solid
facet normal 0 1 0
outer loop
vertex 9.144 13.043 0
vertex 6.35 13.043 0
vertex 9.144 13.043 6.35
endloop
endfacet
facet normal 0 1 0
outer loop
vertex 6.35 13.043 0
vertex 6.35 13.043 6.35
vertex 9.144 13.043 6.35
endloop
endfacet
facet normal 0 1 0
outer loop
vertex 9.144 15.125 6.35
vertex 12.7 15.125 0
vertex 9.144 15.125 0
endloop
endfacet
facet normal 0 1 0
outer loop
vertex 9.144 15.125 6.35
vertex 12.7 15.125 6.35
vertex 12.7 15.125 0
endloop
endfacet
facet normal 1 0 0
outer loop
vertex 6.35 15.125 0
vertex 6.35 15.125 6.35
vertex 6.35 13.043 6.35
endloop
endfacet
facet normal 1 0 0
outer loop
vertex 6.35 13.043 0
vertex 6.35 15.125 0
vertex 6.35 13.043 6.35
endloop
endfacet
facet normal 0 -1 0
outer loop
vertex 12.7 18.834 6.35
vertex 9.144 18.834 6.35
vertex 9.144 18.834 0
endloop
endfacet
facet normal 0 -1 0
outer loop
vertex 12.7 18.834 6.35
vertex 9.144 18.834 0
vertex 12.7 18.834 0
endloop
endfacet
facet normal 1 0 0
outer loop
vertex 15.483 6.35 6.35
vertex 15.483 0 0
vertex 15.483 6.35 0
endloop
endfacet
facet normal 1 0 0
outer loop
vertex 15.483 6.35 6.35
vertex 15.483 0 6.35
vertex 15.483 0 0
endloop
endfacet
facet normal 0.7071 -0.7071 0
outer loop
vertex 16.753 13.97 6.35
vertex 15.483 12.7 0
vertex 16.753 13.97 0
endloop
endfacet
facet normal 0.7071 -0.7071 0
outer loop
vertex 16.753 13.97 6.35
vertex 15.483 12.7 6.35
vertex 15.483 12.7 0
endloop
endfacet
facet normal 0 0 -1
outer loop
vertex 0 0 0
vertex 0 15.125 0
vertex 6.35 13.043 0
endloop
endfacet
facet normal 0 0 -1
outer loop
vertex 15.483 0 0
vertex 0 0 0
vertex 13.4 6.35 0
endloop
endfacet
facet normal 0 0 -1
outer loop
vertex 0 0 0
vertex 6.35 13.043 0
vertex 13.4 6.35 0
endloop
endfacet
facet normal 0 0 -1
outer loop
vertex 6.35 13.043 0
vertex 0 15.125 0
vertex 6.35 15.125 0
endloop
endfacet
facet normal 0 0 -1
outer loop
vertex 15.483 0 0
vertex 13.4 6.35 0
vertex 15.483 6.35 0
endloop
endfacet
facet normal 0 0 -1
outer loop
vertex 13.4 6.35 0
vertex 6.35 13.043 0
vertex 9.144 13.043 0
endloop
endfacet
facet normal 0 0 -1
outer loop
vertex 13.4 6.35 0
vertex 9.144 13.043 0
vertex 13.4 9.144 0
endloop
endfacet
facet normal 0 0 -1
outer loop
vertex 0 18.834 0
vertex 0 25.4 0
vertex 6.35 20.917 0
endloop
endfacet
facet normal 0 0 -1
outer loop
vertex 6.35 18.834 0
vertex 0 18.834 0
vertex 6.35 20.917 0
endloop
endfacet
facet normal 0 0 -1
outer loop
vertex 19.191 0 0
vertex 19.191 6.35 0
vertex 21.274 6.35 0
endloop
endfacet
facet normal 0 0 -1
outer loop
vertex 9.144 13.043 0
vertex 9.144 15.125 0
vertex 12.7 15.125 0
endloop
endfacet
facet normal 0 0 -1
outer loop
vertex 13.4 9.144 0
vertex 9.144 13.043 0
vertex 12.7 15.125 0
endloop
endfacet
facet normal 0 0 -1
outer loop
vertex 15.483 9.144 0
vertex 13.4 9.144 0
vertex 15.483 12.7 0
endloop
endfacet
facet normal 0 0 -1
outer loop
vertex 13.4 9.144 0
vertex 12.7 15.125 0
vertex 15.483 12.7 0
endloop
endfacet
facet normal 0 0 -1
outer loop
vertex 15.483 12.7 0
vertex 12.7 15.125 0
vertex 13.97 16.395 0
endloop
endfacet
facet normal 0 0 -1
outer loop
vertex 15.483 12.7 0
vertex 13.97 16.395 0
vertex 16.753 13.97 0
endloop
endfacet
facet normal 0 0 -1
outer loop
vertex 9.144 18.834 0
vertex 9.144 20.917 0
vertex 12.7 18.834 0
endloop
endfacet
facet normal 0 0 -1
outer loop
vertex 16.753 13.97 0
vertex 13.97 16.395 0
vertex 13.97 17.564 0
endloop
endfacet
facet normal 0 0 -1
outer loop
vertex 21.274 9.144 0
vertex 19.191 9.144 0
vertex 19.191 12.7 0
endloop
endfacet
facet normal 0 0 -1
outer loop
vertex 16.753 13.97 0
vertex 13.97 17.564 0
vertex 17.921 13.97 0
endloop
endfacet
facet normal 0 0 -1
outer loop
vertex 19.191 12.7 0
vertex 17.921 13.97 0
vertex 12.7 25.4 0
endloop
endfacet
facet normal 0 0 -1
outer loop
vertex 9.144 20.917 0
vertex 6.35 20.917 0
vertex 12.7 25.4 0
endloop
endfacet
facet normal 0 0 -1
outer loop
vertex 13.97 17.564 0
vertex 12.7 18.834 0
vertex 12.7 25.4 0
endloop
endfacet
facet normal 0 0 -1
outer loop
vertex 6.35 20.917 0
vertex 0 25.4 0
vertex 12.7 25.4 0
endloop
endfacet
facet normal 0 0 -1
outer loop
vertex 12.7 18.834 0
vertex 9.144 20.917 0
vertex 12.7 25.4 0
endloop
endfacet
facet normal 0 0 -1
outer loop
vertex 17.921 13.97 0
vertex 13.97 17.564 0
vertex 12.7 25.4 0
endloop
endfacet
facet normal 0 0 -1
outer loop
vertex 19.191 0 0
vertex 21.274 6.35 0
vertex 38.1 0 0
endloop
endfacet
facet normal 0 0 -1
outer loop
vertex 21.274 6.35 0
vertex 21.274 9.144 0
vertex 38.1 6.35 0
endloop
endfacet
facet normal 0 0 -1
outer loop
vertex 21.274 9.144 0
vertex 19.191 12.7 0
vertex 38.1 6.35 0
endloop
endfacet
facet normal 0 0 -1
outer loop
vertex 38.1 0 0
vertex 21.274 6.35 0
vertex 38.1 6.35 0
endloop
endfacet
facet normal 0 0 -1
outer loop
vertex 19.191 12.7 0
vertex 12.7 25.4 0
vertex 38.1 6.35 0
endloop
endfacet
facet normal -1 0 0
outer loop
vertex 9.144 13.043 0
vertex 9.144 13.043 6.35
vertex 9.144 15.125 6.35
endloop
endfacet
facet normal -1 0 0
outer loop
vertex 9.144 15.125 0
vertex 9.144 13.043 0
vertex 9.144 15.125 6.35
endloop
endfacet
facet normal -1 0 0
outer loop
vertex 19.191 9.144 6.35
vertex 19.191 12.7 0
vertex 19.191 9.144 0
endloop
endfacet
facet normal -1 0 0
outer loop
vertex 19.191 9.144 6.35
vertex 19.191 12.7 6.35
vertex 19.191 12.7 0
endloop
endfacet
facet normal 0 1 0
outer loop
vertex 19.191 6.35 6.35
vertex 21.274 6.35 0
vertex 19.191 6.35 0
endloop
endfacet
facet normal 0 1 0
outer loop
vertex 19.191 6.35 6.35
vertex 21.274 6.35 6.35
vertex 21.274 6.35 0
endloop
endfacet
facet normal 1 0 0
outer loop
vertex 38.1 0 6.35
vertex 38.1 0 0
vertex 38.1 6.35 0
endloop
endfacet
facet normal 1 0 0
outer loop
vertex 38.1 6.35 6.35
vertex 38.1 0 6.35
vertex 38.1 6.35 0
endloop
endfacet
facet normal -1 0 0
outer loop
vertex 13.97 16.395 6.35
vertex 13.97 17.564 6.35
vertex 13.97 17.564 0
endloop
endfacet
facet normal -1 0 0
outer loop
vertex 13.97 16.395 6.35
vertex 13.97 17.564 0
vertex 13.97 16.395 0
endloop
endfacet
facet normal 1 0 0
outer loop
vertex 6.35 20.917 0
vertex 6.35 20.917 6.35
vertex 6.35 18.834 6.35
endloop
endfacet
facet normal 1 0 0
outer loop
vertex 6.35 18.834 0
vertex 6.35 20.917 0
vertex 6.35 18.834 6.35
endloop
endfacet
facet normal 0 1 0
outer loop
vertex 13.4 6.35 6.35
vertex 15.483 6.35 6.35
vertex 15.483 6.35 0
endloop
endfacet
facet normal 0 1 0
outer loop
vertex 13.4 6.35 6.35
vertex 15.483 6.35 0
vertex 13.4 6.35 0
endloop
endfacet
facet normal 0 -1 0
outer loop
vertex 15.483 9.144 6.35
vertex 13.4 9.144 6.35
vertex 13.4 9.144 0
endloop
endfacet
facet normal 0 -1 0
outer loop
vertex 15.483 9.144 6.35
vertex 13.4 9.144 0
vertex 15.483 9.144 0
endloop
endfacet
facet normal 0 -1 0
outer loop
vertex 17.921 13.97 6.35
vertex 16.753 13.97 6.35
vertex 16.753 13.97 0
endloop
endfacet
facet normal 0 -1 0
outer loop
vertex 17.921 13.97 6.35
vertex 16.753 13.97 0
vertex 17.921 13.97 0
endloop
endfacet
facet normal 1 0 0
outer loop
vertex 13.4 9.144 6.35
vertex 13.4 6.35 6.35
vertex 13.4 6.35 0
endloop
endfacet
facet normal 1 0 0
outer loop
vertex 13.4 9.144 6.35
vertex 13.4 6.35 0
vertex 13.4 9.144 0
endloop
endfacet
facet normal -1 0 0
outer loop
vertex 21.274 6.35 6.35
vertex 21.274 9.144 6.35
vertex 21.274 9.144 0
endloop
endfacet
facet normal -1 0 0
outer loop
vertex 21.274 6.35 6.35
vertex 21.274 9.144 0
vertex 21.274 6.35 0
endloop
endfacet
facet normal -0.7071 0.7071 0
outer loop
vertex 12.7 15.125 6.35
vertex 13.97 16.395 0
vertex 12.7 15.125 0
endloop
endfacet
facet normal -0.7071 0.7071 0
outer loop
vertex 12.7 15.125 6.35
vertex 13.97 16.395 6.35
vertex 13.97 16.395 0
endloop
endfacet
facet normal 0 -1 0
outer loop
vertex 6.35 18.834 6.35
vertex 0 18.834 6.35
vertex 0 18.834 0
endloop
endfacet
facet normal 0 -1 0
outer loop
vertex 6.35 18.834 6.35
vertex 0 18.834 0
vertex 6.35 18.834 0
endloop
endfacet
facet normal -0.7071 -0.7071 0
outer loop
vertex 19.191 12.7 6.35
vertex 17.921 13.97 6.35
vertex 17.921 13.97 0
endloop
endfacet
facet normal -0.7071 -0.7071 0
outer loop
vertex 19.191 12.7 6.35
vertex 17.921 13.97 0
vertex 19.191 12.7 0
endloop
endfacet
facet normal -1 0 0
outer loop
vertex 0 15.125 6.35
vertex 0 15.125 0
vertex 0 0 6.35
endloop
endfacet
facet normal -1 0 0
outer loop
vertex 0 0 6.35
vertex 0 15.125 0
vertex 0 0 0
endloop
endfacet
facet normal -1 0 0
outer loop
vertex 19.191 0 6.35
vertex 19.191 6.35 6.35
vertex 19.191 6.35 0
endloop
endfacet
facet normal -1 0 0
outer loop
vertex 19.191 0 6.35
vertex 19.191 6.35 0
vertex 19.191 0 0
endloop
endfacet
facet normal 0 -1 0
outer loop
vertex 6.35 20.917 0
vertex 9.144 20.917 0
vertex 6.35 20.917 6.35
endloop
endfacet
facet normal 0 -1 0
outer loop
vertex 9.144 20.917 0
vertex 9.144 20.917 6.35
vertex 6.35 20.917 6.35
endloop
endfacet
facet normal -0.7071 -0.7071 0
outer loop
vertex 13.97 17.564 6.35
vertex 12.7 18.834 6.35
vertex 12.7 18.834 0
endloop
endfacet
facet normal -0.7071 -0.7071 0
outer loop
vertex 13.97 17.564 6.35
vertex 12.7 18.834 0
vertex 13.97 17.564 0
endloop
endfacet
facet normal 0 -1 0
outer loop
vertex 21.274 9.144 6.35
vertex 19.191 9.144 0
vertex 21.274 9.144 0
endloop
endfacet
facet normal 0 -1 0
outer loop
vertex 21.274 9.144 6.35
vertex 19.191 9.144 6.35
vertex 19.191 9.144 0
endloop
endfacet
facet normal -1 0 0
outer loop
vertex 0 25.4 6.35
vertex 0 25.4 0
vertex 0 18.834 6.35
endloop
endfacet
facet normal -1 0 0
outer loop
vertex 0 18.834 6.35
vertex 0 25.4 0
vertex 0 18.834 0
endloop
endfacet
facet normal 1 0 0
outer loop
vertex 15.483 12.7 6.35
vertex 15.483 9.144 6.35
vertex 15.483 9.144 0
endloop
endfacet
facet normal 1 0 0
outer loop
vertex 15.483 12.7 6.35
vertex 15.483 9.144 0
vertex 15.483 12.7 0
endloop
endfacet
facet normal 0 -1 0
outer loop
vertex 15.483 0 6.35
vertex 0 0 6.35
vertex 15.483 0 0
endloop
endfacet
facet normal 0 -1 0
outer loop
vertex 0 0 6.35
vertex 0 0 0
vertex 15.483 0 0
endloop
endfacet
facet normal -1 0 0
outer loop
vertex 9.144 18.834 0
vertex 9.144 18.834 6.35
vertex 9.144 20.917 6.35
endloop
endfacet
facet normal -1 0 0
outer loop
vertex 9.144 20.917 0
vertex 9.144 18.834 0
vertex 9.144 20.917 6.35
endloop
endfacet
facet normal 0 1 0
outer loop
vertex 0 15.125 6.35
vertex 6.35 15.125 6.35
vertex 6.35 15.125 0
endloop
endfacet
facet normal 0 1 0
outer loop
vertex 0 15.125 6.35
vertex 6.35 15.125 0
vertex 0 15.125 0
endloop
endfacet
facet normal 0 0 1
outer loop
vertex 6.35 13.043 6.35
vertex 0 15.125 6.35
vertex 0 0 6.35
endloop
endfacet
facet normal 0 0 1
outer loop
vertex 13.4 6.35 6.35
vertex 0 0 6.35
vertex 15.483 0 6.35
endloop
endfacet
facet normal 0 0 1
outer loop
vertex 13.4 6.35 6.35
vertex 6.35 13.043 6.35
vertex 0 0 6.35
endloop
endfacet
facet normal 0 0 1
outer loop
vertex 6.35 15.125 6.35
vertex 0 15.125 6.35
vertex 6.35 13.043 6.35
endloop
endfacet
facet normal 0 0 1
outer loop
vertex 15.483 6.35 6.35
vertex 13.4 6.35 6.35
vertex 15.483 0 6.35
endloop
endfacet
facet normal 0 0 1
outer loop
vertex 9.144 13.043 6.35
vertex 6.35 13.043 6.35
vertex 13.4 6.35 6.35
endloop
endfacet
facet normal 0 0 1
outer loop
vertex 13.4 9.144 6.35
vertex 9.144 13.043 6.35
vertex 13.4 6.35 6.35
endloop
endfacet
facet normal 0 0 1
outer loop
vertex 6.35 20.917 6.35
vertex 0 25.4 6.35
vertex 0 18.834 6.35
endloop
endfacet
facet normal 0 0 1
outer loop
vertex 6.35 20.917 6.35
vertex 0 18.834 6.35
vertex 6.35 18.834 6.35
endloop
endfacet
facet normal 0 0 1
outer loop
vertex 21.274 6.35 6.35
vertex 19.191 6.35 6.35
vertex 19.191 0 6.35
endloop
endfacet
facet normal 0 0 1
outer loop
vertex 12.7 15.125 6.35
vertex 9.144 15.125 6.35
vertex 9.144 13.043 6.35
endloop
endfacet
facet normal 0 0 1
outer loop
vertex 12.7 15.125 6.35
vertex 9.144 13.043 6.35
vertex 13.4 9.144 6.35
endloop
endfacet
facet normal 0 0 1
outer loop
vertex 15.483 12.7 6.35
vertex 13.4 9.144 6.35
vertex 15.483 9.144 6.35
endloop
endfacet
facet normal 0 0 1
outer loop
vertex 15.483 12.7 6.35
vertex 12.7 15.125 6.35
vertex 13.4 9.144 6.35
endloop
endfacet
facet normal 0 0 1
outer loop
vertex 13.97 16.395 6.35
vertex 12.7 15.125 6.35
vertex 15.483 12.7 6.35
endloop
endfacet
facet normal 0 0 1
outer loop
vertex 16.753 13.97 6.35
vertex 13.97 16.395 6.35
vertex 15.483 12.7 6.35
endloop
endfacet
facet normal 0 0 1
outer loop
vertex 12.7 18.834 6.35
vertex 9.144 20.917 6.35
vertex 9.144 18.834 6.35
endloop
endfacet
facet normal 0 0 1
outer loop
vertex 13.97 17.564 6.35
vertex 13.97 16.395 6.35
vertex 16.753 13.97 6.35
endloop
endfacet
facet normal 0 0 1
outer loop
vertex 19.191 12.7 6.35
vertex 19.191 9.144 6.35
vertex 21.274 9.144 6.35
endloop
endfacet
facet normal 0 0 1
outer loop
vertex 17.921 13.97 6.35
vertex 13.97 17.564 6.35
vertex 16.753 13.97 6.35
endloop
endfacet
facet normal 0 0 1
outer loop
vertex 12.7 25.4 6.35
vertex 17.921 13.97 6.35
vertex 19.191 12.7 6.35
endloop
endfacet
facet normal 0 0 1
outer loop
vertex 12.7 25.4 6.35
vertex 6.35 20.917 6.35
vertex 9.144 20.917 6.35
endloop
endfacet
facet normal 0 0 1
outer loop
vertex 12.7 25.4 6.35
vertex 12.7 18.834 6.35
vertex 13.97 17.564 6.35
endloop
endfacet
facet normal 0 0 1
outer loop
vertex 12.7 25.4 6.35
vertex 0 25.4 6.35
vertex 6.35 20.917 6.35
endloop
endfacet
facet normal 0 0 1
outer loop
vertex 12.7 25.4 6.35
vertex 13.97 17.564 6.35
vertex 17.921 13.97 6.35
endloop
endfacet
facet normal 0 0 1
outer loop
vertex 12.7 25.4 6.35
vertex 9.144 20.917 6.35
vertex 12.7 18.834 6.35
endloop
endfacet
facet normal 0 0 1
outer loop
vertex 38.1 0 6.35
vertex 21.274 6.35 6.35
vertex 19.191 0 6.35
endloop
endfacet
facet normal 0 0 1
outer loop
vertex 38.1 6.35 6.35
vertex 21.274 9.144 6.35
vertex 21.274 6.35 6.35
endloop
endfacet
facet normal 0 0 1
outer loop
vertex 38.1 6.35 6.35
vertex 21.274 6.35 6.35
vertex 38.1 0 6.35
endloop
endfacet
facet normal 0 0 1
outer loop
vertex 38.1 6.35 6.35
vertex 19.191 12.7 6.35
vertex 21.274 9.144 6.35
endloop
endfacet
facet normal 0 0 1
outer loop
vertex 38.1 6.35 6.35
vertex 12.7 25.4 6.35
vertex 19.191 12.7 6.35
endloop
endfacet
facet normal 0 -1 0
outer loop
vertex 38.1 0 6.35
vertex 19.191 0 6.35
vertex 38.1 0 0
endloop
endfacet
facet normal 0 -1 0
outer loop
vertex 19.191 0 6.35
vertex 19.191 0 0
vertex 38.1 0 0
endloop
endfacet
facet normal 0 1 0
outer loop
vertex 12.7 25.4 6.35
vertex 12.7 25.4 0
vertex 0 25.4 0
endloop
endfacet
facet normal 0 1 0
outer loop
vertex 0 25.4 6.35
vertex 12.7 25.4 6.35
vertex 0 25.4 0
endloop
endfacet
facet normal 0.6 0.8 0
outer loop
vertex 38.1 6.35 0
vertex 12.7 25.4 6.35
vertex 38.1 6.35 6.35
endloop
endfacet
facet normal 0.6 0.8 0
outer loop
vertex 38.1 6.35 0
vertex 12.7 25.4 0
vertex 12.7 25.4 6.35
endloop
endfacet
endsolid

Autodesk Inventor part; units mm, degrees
ref_plane "YZ Plane" through (0, 0, 0) normal (1, 0, 0) x (0, 1, 0)
ref_plane "XZ Plane" through (0, 0, 0) normal (0, 1, 0) x (-1, 0, 0)
ref_plane "XY Plane" through (0, 0, 0) normal (0, 0, 1) x (1, 0, 0)
sketch "Sketch1" plane through (0, 0, 0) normal (0, 0, 1) x (1, 0, 0)
  line L0 (0, 0) -> (38.1, 0)
  line L1 (38.1, 0) -> (38.1, 6.35)
  line L2 (12.7, 25.4) -> (0, 25.4)
  line L3 (0, 25.4) -> (0, 0)
  line L4 (12.7, 25.4) -> (38.1, 6.35)
  dimension "d2" = 6.35
  dimension "d3" = 12.7
  dimension "d4" = 25.4
  dimension "d5" = 38.1
  dimension "d7" = 27.94
  dimension "d8" = 38.1
extrude "Extrusion1" add sketch "Sketch1" along normal blind 6.35
sketch "Sketch2" plane through (0, 0, 6.35) normal (0, 0, 1) x (1, 0, 0)
  line L0 (0, 0) -> (38.1, 0) projected
  line L1 (0, 25.4) -> (0, 0) projected
  line L2 (0, 18.8338) -> (-6.35, 18.8338)
  line L3 (0, 15.1254) -> (-6.35, 15.1254)
  line L4 (15.4827, -6.35) -> (15.4827, 0)
  line L5 (19.1911, -6.35) -> (19.1911, 0)
  line L6 (0, 18.8338) -> (12.7, 18.8338)
  line L7 (13.97, 17.5638) -> (13.97, 16.3954)
  line L8 (12.7, 15.1254) -> (0, 15.1254)
  line L9 (0, 15.1254) -> (0, 18.8338)
  line L10 (19.1911, 0) -> (15.4827, 0)
  line L11 (15.4827, 0) -> (15.4827, 12.7)
  line L12 (16.7527, 13.97) -> (17.9211, 13.97)
  line L13 (19.1911, 12.7) -> (19.1911, 0)
  line L14 (12.7, 18.8338) -> (13.97, 17.5638)
  line L15 (13.97, 16.3954) -> (12.7, 15.1254)
  line L16 (15.4827, 12.7) -> (16.7527, 13.97)
  line L17 (17.9211, 13.97) -> (19.1911, 12.7)
  line L18 (9.144, 20.9166) -> (6.35, 20.9166)
  line L19 (6.35, 20.9166) -> (6.35, 13.0426)
  line L20 (6.35, 13.0426) -> (9.144, 13.0426)
  line L21 (9.144, 13.0426) -> (9.144, 20.9166)
  line L22 (21.2739, 6.35) -> (13.3999, 6.35)
  line L23 (13.3999, 6.35) -> (13.3999, 9.144)
  line L24 (13.3999, 9.144) -> (21.2739, 9.144)
  line L25 (21.2739, 9.144) -> (21.2739, 6.35)
  point P0 (13.97, 15.1254)
  point P1 (13.97, 18.8338)
  point P2 (15.4827, 13.97)
  point P3 (19.1911, 13.97)
  point P4 (19.05, 0)
  dimension "d11" = 13.97
  dimension "d12" = 13.97
  dimension "d13" = 1.27
  dimension "d14" = 1.27
  dimension "d15" = 1.27
  dimension "d16" = 1.27
  dimension "d17" = 1.27
  dimension "d18" = 1.27
  dimension "d19" = 1.27
  dimension "d20" = 1.27
  dimension "d21" = 2.794
  dimension "d22" = 7.874
  dimension "d23" = 6.35
  dimension "d26" = 2.0828
  dimension "d27" = 2.0828
  dimension "d28" = 7.874
  dimension "d29" = 2.794
  dimension "d30" = 2.0828
  dimension "d31" = 6.35
extrude "Extrusion2" cut sketch "Sketch2" against normal through all
equation "\"d14\" = d13"
equation "\"d15\" = d13"
equation "\"d16\" = d15"
equation "\"d17\" = d13"
equation "\"d18\" = d17"
equation "\"d19\" = d13"
equation "\"d20\" = d19"
equation "\"d26\" = d27"
equation "\"d30\" = d27"
equation "\"d31\" = d23"
properties part number "cornerBraceV01"
